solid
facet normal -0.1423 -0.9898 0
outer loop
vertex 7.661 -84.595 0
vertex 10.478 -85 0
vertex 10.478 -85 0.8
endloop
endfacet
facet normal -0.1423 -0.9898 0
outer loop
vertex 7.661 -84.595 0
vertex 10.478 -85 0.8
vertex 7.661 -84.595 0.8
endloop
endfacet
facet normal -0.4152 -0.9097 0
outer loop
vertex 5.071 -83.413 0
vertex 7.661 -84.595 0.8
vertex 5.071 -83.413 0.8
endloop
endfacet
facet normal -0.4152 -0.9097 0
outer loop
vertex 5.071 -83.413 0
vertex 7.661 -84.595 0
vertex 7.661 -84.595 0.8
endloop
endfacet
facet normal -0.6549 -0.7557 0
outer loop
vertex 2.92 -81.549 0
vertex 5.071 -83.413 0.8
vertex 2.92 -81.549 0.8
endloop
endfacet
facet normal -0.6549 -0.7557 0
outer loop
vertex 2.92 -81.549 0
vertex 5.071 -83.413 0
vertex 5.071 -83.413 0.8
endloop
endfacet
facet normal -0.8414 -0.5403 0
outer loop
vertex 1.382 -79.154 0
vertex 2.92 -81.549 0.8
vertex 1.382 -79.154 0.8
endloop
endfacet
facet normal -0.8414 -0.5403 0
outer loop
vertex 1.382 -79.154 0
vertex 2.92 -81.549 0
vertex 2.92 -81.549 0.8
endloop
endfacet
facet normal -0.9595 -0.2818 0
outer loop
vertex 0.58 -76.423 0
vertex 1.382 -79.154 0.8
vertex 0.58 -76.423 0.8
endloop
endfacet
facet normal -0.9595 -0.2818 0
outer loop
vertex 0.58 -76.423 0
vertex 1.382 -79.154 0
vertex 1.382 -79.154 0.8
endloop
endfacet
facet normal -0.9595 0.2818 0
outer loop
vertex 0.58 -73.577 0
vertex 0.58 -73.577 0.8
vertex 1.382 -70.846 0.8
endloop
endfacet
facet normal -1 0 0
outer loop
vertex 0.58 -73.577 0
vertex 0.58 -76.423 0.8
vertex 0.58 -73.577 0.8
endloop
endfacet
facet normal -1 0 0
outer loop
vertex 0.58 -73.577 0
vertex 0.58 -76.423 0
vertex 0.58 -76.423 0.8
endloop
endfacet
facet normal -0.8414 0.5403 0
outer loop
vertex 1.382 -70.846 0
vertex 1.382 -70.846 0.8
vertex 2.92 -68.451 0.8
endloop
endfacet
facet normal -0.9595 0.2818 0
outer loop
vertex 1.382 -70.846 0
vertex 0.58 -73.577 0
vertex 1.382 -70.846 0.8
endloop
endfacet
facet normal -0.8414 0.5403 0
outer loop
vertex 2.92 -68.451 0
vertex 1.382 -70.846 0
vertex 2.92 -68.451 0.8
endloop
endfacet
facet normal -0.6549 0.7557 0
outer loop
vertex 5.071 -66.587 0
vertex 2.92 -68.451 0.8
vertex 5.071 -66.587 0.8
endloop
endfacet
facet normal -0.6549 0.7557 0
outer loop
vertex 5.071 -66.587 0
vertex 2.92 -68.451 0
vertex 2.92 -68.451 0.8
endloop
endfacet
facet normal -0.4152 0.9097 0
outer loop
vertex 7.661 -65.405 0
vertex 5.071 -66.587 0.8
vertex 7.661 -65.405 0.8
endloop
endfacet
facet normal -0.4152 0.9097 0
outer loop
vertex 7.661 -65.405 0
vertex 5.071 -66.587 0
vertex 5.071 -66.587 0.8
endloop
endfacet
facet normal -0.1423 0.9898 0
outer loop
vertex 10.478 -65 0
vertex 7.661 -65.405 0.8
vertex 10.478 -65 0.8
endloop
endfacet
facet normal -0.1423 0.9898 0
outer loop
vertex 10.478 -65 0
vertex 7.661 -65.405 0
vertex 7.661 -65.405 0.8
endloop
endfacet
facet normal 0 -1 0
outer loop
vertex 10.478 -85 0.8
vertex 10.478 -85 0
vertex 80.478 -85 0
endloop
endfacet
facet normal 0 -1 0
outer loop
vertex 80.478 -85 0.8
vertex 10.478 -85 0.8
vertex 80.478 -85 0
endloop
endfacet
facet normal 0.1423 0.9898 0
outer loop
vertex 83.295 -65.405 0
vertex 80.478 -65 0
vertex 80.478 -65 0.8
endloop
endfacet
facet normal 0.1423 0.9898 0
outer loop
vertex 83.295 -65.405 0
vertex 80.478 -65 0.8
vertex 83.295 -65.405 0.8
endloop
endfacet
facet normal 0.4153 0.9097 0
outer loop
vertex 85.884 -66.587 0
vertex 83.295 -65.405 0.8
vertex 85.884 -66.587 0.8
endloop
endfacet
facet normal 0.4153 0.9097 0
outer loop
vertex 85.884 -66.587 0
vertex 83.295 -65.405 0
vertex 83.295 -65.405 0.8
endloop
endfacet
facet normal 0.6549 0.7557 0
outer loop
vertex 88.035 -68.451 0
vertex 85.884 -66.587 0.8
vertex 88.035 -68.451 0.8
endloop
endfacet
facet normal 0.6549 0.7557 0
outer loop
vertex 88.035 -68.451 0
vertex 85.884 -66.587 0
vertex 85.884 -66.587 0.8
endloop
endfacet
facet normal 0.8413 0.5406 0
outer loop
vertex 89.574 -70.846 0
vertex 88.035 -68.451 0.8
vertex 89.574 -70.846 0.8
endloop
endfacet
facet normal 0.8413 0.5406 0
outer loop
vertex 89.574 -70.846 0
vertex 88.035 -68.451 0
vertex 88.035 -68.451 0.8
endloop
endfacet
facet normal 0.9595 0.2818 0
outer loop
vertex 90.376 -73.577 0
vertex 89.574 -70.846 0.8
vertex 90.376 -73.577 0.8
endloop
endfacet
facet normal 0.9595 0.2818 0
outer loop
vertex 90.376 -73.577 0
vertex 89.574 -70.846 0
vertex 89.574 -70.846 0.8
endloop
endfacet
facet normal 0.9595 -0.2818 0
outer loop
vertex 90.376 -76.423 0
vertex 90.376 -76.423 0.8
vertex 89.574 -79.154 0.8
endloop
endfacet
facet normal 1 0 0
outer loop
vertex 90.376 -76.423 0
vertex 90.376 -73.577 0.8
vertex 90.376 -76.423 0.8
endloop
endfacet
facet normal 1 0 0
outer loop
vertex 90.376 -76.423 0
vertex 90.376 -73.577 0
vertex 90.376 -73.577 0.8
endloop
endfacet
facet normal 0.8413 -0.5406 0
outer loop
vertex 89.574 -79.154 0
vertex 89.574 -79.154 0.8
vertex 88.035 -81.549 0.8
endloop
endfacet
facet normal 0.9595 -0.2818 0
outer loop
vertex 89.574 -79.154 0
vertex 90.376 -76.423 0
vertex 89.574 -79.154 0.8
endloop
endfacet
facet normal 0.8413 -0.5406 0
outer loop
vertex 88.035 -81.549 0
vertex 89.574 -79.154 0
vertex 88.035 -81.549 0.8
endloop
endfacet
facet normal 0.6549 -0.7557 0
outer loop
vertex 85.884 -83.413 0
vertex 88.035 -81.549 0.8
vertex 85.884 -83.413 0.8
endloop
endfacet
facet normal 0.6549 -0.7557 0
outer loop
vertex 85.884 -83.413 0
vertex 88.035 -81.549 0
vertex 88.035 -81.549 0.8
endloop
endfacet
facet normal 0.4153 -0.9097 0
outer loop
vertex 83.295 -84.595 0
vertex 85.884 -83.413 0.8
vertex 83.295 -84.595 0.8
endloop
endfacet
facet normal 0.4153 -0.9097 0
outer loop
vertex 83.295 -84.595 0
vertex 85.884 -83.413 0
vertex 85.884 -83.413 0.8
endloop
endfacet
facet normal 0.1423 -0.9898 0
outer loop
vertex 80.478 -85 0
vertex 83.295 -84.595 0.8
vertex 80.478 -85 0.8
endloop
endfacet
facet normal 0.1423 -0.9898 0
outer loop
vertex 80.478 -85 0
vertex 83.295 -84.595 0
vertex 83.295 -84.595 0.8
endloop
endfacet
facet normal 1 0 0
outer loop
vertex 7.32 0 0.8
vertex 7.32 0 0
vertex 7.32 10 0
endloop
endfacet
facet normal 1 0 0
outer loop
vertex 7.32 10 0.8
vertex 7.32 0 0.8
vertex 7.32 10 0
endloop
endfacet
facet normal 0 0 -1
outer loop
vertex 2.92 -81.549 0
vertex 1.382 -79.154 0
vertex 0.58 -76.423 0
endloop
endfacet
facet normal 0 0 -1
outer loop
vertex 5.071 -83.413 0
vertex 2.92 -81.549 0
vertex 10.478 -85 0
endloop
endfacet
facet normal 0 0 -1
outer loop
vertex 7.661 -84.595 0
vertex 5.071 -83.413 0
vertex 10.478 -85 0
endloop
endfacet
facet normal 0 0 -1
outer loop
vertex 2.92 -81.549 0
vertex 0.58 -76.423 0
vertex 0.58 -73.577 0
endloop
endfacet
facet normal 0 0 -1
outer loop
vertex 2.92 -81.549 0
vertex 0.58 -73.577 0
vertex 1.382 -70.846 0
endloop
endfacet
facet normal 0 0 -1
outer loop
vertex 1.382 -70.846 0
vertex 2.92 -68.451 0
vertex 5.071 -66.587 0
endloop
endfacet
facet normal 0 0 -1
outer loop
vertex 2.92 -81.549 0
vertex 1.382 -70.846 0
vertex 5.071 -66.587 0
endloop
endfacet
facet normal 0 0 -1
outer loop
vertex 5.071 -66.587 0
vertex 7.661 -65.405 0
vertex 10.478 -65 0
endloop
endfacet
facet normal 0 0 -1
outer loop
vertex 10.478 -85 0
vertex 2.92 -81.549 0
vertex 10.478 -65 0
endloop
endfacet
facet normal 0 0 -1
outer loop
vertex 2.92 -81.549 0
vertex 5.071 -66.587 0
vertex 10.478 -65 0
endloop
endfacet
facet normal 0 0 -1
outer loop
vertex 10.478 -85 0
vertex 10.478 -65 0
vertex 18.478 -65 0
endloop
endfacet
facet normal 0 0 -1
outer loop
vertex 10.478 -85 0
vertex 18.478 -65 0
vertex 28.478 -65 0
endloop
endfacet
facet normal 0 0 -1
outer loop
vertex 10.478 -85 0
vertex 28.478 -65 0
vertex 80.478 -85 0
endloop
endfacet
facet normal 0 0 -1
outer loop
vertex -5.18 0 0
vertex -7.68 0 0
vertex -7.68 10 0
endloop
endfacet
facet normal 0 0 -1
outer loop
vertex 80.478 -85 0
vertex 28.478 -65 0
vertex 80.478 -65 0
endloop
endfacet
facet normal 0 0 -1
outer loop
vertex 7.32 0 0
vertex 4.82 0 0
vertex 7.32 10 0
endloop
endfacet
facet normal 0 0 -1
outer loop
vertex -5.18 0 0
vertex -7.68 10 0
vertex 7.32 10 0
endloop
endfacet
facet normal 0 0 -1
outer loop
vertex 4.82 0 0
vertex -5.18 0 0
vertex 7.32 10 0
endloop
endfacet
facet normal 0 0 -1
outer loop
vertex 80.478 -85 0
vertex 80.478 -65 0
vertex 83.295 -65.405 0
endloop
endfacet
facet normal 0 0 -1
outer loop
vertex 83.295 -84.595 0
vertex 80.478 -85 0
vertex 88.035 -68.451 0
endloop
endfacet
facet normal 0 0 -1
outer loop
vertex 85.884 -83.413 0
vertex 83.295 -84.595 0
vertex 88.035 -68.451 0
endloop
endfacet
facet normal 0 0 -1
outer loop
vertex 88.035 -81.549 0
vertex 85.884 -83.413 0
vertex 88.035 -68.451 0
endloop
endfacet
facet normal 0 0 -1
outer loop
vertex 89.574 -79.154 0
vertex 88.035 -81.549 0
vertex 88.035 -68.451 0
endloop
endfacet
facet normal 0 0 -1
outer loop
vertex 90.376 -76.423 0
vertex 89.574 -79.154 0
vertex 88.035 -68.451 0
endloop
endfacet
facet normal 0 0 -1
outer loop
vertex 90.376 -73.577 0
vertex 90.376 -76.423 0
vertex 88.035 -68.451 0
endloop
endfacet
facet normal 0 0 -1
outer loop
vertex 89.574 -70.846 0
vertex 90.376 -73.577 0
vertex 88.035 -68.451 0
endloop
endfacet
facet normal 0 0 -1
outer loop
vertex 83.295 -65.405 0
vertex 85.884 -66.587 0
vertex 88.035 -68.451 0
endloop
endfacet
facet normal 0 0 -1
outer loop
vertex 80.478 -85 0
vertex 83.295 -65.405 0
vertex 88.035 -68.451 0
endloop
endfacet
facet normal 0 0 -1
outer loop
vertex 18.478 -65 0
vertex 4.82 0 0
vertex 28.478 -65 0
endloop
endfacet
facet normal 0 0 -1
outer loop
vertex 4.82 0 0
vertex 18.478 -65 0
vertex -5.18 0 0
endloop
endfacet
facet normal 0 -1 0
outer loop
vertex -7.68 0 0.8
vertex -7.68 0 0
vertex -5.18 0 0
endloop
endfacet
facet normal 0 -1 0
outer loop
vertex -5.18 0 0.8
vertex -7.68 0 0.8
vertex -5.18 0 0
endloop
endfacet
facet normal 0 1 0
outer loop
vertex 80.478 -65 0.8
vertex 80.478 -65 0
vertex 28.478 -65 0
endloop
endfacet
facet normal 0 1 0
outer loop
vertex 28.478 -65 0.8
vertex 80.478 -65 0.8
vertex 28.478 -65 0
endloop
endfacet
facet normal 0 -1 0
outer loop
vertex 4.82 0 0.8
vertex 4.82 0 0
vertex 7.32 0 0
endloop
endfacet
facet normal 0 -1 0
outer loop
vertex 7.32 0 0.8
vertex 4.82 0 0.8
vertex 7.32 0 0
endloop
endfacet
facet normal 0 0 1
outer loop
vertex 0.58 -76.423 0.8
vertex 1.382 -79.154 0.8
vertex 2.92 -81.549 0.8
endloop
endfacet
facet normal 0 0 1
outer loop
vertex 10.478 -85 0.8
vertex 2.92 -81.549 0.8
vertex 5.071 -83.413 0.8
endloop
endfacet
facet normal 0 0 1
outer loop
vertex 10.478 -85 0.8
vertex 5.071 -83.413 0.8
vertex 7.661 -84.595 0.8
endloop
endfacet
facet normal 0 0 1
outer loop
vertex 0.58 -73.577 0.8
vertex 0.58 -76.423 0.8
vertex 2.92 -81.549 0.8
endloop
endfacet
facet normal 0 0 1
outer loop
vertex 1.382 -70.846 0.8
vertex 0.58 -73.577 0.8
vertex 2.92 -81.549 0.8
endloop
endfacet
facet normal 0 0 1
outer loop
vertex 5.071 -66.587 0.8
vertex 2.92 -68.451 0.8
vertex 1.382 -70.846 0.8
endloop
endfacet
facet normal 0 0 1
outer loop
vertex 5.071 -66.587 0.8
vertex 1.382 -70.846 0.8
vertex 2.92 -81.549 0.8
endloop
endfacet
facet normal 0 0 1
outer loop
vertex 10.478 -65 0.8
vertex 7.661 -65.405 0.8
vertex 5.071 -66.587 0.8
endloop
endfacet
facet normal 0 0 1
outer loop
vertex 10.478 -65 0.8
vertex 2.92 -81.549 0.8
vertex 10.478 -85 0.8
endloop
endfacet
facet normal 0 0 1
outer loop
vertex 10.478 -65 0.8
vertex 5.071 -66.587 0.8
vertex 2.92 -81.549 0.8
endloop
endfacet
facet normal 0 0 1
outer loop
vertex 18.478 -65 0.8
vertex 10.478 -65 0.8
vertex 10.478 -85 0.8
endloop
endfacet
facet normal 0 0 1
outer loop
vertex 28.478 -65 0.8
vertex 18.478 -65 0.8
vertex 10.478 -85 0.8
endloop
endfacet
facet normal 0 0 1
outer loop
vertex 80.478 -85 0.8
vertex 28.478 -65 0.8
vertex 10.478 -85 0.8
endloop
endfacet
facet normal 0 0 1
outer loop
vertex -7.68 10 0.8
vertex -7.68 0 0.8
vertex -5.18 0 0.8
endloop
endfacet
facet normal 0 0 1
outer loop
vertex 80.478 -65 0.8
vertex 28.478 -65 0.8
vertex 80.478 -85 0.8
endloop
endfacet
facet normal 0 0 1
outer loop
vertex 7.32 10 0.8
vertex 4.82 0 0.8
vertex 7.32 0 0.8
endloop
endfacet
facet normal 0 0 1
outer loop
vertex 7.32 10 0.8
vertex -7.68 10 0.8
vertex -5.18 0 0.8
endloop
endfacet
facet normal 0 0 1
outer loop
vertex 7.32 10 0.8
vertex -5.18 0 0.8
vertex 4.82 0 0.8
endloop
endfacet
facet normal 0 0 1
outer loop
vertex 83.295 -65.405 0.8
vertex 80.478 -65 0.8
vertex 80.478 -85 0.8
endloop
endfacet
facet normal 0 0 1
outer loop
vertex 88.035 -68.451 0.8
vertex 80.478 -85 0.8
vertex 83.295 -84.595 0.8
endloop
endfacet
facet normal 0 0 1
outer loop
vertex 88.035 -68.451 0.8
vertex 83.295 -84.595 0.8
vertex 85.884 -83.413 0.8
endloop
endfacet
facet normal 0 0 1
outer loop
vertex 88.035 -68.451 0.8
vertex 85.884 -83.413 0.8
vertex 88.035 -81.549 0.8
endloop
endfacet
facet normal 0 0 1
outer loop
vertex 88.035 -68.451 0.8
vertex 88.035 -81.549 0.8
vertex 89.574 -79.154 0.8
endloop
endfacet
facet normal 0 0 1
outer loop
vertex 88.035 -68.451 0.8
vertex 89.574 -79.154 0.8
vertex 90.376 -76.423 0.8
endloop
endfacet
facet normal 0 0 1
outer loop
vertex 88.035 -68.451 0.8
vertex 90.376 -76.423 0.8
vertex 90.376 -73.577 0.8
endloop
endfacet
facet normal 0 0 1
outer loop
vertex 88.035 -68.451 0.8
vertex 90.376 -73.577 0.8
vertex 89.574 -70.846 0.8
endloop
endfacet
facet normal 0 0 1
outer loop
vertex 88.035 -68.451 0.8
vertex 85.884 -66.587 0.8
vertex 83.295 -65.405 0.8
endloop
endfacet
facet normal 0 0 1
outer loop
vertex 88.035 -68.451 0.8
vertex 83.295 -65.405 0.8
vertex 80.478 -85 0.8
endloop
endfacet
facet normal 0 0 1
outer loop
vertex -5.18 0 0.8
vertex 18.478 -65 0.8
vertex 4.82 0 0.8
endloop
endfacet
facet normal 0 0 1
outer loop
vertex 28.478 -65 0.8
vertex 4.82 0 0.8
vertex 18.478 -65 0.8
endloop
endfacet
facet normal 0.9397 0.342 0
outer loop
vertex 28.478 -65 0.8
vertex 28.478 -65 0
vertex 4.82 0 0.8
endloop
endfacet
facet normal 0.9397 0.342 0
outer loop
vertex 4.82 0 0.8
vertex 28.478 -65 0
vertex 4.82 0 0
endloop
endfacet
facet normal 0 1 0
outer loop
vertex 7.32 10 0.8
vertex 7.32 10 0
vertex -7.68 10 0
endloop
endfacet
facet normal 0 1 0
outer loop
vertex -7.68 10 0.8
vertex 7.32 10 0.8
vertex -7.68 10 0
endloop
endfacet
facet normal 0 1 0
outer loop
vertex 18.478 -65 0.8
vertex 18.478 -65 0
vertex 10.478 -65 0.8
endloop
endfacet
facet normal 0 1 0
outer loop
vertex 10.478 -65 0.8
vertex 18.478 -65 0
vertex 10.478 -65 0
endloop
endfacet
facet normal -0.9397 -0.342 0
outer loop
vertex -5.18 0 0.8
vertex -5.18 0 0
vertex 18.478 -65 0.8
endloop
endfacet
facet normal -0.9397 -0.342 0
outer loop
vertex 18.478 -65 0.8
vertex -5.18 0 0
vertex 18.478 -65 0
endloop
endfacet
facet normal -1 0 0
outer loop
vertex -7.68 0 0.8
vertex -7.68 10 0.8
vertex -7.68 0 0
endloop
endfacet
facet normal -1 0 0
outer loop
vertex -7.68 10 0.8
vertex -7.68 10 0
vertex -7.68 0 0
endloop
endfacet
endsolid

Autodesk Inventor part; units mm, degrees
ref_plane "YZ Plane" through (0, 0, 0) normal (1, 0, 0) x (0, 1, 0)
ref_plane "XZ Plane" through (0, 0, 0) normal (0, 1, 0) x (-1, 0, 0)
ref_plane "XY Plane" through (0, 0, 0) normal (0, 0, 1) x (1, 0, 0)
ref_plane "Płaszczyzna konstrukcyjna1" through (0, 0, 0) normal (0, 0, 1) x (1, 0, 0)
sketch "Szkic1" plane through (0, 0, 0) normal (0, 0, 1) x (1, 0, 0)
  line L0 (-7.6801, 0) -> (-5.1801, 0)
  line L1 (-5.1801, 0) -> (18.4779, -65)
  line L2 (18.4779, -65) -> (10.4779, -65)
  arc A0 (10.4779, -65) -> (10.4779, -85) centre (10.4779, -75) ccw
  line L3 (10.4779, -85) -> (80.4779, -85)
  arc A1 (80.4779, -85) -> (80.4779, -65) centre (80.4779, -75) ccw
  line L4 (80.4779, -65) -> (28.4779, -65)
  line L5 (28.4779, -65) -> (4.8199, 0)
  line L6 (4.8199, 0) -> (7.3199, 0)
  line L7 (7.3199, 0) -> (7.3199, 10)
  line L8 (7.3199, 10) -> (-7.6801, 10)
  line L9 (-7.6801, 10) -> (-7.6801, 0)
  point P0 (0, 0)
extrude "Płyta1" add sketch "Szkic1" along normal blind 0.8
equation "\"PromieńGięcia\" = Grubość"
equation "\"SzerokośćGięciaPodcięcia\" = Grubość"
equation "\"GłębokośćGięciaPodcięcia\" = 0.5 * Grubość"
equation "\"RozmiarPodcięciaNarożnika\" = 4 * Grubość"
equation "\"MinimalnaPozostałość\" = 2 * Grubość"
equation "\"PromieńPrzejścia\" = PromieńGięcia"
equation "\"Rozmiar_promienia_Jacobiego\" = Grubość"
equation "\"Wielk_odstępu\" = Grubość"
equation "\"d0\" = PromieńGięcia"
equation "\"Grubość\" = 0.8"
properties part number "club_ABS_metal"
